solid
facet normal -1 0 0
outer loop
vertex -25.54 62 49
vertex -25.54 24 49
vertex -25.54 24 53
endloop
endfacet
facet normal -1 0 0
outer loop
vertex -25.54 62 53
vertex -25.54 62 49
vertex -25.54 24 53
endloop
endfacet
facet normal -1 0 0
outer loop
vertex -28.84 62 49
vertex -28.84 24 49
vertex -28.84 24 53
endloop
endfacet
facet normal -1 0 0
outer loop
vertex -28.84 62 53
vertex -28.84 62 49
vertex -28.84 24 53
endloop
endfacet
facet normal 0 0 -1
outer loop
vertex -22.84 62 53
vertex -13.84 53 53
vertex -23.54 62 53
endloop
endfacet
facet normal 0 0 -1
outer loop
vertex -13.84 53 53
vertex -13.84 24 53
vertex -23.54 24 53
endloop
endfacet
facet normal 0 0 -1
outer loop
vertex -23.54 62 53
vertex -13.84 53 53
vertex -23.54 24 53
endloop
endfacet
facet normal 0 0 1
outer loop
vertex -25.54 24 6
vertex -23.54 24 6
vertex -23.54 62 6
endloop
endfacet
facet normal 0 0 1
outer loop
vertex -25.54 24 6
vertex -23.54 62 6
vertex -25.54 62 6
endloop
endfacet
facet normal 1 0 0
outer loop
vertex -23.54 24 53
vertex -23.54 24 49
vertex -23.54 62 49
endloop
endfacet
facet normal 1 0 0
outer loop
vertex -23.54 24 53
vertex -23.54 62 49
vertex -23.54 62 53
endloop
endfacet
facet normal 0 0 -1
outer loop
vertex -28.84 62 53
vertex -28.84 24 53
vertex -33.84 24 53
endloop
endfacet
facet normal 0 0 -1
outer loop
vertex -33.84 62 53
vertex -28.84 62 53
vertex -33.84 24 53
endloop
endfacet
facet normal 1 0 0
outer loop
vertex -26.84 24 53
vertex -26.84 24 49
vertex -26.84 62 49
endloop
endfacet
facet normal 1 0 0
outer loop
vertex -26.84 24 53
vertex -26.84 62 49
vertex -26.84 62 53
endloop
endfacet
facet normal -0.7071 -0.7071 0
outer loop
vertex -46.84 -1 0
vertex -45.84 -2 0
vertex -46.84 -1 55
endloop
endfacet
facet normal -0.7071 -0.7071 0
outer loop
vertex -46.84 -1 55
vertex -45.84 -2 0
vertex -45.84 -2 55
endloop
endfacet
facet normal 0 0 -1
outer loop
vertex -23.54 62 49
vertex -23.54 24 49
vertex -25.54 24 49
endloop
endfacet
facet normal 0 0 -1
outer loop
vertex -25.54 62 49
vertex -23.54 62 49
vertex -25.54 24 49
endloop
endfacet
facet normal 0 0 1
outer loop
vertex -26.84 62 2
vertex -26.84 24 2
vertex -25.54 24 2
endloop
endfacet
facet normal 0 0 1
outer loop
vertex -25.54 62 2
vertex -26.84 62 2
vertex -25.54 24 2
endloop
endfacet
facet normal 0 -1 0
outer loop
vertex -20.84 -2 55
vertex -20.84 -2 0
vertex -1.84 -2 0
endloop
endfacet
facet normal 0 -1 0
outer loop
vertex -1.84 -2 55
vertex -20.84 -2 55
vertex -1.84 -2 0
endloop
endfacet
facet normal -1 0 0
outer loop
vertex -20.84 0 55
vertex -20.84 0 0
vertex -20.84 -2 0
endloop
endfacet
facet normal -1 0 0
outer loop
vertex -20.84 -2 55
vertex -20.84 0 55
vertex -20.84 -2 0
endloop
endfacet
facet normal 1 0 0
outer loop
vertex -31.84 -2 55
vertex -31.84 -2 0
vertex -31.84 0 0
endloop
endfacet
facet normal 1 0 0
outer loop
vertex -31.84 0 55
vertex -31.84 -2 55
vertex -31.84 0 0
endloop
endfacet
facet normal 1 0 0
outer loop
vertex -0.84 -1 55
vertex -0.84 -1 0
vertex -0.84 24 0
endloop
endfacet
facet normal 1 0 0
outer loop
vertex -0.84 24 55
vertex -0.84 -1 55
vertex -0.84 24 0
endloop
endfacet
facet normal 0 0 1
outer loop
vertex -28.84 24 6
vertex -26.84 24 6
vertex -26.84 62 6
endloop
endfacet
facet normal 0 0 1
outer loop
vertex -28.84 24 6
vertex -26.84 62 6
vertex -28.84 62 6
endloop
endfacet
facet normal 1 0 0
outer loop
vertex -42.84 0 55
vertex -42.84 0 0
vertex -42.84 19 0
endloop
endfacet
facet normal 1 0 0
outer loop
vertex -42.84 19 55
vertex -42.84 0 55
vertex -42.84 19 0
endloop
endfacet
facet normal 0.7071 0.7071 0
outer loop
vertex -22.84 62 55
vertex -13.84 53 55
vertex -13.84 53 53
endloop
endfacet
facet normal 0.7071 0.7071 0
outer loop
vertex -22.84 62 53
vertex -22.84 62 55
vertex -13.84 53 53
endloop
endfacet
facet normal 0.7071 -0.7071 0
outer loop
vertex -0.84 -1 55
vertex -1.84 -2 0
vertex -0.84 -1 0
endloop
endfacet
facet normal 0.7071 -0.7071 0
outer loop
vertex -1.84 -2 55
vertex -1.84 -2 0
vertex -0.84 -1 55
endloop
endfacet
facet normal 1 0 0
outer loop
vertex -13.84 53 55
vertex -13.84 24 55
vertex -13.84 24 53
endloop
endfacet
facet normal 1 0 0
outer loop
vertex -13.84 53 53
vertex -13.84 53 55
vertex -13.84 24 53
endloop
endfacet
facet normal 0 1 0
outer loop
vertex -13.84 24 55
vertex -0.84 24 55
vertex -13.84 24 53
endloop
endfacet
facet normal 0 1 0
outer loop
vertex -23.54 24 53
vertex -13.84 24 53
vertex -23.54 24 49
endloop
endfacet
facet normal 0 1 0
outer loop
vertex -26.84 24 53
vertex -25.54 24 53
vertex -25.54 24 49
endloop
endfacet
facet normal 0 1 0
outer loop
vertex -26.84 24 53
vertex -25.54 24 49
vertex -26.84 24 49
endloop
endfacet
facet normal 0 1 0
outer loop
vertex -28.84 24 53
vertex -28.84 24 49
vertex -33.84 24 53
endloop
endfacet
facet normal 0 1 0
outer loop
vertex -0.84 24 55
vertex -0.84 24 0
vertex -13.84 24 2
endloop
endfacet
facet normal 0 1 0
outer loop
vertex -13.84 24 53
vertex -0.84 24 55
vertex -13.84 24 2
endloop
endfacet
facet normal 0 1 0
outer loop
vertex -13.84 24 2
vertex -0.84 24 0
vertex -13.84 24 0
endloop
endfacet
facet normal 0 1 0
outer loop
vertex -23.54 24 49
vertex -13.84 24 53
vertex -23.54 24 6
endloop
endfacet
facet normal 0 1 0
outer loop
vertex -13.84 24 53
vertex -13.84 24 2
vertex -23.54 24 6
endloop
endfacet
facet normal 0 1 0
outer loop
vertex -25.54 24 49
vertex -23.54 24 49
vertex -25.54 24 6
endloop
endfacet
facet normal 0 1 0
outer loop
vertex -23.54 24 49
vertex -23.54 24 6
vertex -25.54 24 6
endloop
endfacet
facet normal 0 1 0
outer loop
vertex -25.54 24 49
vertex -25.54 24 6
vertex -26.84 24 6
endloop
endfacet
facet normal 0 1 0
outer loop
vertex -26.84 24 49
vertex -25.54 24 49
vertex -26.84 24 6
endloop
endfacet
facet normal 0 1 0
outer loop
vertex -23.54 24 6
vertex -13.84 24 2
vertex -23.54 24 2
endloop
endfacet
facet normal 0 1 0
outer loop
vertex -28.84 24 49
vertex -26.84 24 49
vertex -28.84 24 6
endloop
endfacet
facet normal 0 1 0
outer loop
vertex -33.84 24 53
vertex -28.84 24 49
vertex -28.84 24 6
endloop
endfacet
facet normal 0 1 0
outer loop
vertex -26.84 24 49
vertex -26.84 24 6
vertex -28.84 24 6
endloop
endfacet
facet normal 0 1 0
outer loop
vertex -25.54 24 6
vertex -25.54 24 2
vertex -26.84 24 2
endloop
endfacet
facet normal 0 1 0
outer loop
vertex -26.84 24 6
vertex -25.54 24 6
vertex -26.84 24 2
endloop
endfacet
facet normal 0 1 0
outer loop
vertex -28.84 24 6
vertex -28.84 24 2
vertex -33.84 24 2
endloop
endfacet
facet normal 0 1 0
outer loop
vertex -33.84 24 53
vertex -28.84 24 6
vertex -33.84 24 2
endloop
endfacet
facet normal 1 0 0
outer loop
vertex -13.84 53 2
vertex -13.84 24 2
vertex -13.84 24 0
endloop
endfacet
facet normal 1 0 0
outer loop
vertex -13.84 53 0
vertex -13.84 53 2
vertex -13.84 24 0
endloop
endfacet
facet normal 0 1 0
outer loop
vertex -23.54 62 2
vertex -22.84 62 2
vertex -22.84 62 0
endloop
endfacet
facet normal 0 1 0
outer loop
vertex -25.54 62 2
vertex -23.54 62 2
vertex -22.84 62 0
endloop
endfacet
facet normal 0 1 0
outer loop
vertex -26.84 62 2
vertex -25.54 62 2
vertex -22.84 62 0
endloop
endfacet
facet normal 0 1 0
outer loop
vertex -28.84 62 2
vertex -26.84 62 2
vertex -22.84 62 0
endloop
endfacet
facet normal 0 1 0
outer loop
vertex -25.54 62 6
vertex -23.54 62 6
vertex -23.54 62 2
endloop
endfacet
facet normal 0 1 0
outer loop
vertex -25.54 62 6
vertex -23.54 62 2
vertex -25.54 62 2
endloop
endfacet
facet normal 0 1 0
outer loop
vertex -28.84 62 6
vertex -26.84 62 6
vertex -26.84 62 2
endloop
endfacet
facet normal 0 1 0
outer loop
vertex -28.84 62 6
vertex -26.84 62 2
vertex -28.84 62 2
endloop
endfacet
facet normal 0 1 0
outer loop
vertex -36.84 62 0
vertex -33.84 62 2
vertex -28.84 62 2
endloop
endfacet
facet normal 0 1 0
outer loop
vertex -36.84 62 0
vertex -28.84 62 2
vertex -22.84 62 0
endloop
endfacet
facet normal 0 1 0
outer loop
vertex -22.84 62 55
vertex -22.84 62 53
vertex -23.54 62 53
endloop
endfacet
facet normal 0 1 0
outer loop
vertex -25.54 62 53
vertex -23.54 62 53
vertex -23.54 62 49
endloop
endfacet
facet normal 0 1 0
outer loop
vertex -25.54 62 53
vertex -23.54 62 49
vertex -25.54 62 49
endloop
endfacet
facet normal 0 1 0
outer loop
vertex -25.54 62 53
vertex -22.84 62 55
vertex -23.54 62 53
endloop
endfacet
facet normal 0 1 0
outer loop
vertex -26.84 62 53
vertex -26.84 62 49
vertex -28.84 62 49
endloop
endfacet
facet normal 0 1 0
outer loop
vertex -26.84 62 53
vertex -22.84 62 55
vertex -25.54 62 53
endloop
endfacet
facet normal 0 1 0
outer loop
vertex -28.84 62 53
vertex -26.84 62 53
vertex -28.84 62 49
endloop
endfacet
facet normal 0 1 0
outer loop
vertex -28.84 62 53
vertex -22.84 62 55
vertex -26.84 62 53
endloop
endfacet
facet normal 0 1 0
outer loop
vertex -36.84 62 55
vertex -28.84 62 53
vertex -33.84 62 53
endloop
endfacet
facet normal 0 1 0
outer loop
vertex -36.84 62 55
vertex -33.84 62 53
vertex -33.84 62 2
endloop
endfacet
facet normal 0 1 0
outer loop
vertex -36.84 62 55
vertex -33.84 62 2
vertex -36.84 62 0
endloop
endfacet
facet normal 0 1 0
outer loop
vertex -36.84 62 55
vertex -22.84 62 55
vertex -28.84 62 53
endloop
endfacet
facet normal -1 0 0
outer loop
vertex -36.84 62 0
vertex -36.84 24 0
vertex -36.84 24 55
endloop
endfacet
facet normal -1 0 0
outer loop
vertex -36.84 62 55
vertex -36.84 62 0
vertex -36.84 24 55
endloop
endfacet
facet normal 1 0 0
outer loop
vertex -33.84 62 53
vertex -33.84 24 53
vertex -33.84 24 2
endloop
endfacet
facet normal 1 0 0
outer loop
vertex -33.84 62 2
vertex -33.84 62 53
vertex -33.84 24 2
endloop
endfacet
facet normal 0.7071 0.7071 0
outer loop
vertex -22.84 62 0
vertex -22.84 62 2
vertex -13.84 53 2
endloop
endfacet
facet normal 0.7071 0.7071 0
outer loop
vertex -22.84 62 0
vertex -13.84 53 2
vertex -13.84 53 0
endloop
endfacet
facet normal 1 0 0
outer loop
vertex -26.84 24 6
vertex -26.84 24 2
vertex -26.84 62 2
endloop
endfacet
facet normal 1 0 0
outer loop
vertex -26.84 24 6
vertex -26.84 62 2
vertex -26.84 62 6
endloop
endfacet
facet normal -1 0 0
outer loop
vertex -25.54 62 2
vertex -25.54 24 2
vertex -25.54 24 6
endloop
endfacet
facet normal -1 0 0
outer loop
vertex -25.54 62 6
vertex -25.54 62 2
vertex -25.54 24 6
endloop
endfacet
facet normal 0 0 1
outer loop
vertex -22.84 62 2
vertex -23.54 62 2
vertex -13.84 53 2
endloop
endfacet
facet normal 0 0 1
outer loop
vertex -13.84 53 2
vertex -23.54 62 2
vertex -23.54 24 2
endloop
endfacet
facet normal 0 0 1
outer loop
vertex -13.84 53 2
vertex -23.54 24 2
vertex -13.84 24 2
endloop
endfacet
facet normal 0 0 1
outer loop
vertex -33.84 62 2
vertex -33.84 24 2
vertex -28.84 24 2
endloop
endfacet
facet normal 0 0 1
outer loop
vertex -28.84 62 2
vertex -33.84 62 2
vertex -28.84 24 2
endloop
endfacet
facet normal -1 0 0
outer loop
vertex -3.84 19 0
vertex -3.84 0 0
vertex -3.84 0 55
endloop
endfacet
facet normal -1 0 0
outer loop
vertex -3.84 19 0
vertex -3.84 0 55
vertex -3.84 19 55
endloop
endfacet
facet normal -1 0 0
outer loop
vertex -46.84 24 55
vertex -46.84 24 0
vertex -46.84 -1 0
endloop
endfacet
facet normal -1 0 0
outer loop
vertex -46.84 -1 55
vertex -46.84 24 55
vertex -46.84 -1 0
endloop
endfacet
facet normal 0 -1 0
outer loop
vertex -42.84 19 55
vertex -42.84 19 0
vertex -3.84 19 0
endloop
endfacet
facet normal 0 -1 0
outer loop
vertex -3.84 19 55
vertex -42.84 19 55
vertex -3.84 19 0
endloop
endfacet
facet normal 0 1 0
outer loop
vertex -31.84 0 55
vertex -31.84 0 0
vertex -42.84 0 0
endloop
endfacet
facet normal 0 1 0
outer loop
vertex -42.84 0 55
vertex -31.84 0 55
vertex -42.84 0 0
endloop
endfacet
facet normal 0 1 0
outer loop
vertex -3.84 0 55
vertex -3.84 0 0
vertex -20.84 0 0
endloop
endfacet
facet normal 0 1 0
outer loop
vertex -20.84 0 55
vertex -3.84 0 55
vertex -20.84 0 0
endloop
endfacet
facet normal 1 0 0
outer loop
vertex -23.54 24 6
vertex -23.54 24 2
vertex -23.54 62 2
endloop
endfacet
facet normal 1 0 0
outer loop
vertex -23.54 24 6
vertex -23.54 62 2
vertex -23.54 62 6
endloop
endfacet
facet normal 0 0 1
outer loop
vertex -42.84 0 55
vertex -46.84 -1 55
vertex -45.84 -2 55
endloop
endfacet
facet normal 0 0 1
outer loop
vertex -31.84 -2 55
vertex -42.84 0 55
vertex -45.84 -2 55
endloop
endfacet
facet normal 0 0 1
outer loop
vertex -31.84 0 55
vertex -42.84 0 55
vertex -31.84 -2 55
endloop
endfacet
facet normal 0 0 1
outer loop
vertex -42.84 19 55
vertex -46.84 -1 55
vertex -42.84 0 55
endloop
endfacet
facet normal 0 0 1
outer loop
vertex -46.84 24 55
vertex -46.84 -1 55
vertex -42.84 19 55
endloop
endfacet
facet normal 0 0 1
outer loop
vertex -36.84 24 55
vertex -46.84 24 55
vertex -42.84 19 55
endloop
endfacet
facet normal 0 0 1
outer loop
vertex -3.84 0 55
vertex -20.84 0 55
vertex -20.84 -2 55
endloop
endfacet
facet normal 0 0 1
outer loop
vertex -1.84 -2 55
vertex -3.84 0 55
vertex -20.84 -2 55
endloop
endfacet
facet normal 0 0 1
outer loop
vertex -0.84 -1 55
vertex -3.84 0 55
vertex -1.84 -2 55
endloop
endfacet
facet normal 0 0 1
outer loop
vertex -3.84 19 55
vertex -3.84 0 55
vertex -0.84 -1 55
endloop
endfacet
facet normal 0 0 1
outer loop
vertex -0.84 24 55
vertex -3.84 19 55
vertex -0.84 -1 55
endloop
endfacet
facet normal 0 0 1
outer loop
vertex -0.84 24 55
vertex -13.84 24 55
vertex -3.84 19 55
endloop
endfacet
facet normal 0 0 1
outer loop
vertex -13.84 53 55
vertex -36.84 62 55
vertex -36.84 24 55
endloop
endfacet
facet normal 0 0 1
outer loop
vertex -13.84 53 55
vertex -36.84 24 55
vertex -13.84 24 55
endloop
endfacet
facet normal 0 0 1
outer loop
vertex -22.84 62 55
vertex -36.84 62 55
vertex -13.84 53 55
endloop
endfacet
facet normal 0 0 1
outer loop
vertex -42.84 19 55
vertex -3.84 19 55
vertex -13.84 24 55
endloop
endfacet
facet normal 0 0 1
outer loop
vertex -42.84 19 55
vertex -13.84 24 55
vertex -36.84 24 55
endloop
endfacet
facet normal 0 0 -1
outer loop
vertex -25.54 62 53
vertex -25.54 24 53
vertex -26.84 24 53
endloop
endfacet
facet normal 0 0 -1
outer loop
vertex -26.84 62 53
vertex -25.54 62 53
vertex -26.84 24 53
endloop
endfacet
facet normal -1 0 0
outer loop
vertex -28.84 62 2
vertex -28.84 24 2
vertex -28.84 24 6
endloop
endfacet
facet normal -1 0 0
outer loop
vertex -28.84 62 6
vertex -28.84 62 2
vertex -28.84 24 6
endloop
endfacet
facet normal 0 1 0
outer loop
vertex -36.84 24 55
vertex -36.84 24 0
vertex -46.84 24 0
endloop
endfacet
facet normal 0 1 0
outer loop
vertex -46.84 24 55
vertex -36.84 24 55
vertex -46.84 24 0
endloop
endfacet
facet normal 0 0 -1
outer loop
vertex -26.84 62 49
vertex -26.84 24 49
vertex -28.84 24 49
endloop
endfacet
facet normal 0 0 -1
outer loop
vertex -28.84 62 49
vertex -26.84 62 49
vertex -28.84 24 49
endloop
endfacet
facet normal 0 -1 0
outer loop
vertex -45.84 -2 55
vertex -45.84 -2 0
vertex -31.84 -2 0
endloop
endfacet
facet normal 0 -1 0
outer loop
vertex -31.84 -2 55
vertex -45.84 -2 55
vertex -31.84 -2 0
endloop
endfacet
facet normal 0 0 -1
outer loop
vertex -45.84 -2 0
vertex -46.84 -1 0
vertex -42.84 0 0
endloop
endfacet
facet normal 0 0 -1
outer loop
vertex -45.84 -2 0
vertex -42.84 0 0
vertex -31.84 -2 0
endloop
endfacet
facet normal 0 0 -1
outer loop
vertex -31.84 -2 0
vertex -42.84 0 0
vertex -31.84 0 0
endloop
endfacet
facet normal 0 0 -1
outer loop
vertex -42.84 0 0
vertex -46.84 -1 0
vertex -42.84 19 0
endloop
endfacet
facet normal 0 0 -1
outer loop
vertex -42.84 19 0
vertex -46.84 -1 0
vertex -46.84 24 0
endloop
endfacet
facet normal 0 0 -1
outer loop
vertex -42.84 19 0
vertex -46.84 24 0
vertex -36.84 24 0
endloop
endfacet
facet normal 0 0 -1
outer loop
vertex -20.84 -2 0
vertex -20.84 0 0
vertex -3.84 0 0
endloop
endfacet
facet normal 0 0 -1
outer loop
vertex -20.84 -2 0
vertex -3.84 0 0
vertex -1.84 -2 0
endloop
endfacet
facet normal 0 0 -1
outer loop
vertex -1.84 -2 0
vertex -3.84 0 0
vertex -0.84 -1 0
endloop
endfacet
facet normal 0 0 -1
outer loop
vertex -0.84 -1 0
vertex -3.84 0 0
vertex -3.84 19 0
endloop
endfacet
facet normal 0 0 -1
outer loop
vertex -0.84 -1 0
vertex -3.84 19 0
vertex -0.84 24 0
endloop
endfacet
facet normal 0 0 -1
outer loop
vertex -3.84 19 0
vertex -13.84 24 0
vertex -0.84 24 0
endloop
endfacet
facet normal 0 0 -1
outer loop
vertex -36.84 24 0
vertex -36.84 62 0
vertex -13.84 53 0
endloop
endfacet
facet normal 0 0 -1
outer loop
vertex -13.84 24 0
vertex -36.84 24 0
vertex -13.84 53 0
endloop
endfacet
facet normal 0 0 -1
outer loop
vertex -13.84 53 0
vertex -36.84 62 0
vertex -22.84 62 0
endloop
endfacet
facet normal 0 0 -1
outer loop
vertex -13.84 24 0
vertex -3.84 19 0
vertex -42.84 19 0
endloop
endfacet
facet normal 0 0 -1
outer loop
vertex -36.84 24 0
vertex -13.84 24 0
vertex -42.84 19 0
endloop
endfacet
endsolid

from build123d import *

# Parameters (mm, degrees)
F0_W     = 4
F0_H     = 19
F0_W_2   = 3
F1_DEPTH = 55
F2_W     = 2
F2_H     = 4
F3_DEPTH = 38
F4_SIZE  = 9
F5_SIZE  = 1


with BuildPart() as f1:
    # F0 (on Top) → F1 (new body)
    with BuildSketch(Plane.XY):
        Polygon((-0.840026, 24), (-46.840026, 24), (-46.840026, 19), (-42.840026, 19), (-3.840026, 19), (-0.840026, 19), align=None)
        with Locations((-44.840026, 9.5)):
            Rectangle(F0_W, F0_H)
        with Locations((-2.340026, 9.5)):
            Rectangle(F0_W_2, F0_H)
        Polygon((-42.840026, 0), (-46.840026, 0), (-46.840026, -2), (-31.840026, -2), (-31.840026, 0), align=None)
        Polygon((-0.840026, -2), (-0.840026, 0), (-3.840026, 0), (-20.840026, 0), (-20.840026, -2), align=None)
    extrude(amount=F1_DEPTH)

    # F2 (on face) → F3 (join)
    with BuildSketch(Plane(origin=(0, 24, 0), x_dir=(-1, 0, 0), z_dir=(0, 1, 0))):
        Polygon((36.840026, 55), (33.840026, 55), (33.840026, 53), (33.840026, 2), (33.840026, 0), (36.840026, 0), align=None)
        Polygon((33.840026, 53), (33.840026, 55), (13.840026, 55), (13.840026, 53), (23.540026, 53), (25.540026, 53), (26.840026, 53), (28.840026, 53), align=None)
        Polygon((33.840026, 0), (33.840026, 2), (28.840026, 2), (26.840026, 2), (25.540026, 2), (23.540026, 2), (13.840026, 2), (13.840026, 0), align=None)
        with Locations((27.840026, 51)):
            Rectangle(F2_W, F2_H)
        with Locations((27.840026, 4)):
            Rectangle(F2_W, F2_H)
        with Locations((24.540026, 51)):
            Rectangle(F2_W, F2_H)
        with Locations((24.540026, 4)):
            Rectangle(F2_W, F2_H)
    extrude(amount=F3_DEPTH)

    # F4
    f4_edges = [f1.edges().sort_by_distance(p)[0] for p in [
        (-13.840026, 62, 54),
        (-13.840026, 62, 1),
    ]]
    chamfer(f4_edges, length=F4_SIZE)

    # F5
    f5_edges = [f1.edges().sort_by_distance(p)[0] for p in [
        (-0.840026, -2, 27.5),
        (-46.840026, -2, 27.5),
    ]]
    chamfer(f5_edges, length=F5_SIZE)


solid = f1.part
